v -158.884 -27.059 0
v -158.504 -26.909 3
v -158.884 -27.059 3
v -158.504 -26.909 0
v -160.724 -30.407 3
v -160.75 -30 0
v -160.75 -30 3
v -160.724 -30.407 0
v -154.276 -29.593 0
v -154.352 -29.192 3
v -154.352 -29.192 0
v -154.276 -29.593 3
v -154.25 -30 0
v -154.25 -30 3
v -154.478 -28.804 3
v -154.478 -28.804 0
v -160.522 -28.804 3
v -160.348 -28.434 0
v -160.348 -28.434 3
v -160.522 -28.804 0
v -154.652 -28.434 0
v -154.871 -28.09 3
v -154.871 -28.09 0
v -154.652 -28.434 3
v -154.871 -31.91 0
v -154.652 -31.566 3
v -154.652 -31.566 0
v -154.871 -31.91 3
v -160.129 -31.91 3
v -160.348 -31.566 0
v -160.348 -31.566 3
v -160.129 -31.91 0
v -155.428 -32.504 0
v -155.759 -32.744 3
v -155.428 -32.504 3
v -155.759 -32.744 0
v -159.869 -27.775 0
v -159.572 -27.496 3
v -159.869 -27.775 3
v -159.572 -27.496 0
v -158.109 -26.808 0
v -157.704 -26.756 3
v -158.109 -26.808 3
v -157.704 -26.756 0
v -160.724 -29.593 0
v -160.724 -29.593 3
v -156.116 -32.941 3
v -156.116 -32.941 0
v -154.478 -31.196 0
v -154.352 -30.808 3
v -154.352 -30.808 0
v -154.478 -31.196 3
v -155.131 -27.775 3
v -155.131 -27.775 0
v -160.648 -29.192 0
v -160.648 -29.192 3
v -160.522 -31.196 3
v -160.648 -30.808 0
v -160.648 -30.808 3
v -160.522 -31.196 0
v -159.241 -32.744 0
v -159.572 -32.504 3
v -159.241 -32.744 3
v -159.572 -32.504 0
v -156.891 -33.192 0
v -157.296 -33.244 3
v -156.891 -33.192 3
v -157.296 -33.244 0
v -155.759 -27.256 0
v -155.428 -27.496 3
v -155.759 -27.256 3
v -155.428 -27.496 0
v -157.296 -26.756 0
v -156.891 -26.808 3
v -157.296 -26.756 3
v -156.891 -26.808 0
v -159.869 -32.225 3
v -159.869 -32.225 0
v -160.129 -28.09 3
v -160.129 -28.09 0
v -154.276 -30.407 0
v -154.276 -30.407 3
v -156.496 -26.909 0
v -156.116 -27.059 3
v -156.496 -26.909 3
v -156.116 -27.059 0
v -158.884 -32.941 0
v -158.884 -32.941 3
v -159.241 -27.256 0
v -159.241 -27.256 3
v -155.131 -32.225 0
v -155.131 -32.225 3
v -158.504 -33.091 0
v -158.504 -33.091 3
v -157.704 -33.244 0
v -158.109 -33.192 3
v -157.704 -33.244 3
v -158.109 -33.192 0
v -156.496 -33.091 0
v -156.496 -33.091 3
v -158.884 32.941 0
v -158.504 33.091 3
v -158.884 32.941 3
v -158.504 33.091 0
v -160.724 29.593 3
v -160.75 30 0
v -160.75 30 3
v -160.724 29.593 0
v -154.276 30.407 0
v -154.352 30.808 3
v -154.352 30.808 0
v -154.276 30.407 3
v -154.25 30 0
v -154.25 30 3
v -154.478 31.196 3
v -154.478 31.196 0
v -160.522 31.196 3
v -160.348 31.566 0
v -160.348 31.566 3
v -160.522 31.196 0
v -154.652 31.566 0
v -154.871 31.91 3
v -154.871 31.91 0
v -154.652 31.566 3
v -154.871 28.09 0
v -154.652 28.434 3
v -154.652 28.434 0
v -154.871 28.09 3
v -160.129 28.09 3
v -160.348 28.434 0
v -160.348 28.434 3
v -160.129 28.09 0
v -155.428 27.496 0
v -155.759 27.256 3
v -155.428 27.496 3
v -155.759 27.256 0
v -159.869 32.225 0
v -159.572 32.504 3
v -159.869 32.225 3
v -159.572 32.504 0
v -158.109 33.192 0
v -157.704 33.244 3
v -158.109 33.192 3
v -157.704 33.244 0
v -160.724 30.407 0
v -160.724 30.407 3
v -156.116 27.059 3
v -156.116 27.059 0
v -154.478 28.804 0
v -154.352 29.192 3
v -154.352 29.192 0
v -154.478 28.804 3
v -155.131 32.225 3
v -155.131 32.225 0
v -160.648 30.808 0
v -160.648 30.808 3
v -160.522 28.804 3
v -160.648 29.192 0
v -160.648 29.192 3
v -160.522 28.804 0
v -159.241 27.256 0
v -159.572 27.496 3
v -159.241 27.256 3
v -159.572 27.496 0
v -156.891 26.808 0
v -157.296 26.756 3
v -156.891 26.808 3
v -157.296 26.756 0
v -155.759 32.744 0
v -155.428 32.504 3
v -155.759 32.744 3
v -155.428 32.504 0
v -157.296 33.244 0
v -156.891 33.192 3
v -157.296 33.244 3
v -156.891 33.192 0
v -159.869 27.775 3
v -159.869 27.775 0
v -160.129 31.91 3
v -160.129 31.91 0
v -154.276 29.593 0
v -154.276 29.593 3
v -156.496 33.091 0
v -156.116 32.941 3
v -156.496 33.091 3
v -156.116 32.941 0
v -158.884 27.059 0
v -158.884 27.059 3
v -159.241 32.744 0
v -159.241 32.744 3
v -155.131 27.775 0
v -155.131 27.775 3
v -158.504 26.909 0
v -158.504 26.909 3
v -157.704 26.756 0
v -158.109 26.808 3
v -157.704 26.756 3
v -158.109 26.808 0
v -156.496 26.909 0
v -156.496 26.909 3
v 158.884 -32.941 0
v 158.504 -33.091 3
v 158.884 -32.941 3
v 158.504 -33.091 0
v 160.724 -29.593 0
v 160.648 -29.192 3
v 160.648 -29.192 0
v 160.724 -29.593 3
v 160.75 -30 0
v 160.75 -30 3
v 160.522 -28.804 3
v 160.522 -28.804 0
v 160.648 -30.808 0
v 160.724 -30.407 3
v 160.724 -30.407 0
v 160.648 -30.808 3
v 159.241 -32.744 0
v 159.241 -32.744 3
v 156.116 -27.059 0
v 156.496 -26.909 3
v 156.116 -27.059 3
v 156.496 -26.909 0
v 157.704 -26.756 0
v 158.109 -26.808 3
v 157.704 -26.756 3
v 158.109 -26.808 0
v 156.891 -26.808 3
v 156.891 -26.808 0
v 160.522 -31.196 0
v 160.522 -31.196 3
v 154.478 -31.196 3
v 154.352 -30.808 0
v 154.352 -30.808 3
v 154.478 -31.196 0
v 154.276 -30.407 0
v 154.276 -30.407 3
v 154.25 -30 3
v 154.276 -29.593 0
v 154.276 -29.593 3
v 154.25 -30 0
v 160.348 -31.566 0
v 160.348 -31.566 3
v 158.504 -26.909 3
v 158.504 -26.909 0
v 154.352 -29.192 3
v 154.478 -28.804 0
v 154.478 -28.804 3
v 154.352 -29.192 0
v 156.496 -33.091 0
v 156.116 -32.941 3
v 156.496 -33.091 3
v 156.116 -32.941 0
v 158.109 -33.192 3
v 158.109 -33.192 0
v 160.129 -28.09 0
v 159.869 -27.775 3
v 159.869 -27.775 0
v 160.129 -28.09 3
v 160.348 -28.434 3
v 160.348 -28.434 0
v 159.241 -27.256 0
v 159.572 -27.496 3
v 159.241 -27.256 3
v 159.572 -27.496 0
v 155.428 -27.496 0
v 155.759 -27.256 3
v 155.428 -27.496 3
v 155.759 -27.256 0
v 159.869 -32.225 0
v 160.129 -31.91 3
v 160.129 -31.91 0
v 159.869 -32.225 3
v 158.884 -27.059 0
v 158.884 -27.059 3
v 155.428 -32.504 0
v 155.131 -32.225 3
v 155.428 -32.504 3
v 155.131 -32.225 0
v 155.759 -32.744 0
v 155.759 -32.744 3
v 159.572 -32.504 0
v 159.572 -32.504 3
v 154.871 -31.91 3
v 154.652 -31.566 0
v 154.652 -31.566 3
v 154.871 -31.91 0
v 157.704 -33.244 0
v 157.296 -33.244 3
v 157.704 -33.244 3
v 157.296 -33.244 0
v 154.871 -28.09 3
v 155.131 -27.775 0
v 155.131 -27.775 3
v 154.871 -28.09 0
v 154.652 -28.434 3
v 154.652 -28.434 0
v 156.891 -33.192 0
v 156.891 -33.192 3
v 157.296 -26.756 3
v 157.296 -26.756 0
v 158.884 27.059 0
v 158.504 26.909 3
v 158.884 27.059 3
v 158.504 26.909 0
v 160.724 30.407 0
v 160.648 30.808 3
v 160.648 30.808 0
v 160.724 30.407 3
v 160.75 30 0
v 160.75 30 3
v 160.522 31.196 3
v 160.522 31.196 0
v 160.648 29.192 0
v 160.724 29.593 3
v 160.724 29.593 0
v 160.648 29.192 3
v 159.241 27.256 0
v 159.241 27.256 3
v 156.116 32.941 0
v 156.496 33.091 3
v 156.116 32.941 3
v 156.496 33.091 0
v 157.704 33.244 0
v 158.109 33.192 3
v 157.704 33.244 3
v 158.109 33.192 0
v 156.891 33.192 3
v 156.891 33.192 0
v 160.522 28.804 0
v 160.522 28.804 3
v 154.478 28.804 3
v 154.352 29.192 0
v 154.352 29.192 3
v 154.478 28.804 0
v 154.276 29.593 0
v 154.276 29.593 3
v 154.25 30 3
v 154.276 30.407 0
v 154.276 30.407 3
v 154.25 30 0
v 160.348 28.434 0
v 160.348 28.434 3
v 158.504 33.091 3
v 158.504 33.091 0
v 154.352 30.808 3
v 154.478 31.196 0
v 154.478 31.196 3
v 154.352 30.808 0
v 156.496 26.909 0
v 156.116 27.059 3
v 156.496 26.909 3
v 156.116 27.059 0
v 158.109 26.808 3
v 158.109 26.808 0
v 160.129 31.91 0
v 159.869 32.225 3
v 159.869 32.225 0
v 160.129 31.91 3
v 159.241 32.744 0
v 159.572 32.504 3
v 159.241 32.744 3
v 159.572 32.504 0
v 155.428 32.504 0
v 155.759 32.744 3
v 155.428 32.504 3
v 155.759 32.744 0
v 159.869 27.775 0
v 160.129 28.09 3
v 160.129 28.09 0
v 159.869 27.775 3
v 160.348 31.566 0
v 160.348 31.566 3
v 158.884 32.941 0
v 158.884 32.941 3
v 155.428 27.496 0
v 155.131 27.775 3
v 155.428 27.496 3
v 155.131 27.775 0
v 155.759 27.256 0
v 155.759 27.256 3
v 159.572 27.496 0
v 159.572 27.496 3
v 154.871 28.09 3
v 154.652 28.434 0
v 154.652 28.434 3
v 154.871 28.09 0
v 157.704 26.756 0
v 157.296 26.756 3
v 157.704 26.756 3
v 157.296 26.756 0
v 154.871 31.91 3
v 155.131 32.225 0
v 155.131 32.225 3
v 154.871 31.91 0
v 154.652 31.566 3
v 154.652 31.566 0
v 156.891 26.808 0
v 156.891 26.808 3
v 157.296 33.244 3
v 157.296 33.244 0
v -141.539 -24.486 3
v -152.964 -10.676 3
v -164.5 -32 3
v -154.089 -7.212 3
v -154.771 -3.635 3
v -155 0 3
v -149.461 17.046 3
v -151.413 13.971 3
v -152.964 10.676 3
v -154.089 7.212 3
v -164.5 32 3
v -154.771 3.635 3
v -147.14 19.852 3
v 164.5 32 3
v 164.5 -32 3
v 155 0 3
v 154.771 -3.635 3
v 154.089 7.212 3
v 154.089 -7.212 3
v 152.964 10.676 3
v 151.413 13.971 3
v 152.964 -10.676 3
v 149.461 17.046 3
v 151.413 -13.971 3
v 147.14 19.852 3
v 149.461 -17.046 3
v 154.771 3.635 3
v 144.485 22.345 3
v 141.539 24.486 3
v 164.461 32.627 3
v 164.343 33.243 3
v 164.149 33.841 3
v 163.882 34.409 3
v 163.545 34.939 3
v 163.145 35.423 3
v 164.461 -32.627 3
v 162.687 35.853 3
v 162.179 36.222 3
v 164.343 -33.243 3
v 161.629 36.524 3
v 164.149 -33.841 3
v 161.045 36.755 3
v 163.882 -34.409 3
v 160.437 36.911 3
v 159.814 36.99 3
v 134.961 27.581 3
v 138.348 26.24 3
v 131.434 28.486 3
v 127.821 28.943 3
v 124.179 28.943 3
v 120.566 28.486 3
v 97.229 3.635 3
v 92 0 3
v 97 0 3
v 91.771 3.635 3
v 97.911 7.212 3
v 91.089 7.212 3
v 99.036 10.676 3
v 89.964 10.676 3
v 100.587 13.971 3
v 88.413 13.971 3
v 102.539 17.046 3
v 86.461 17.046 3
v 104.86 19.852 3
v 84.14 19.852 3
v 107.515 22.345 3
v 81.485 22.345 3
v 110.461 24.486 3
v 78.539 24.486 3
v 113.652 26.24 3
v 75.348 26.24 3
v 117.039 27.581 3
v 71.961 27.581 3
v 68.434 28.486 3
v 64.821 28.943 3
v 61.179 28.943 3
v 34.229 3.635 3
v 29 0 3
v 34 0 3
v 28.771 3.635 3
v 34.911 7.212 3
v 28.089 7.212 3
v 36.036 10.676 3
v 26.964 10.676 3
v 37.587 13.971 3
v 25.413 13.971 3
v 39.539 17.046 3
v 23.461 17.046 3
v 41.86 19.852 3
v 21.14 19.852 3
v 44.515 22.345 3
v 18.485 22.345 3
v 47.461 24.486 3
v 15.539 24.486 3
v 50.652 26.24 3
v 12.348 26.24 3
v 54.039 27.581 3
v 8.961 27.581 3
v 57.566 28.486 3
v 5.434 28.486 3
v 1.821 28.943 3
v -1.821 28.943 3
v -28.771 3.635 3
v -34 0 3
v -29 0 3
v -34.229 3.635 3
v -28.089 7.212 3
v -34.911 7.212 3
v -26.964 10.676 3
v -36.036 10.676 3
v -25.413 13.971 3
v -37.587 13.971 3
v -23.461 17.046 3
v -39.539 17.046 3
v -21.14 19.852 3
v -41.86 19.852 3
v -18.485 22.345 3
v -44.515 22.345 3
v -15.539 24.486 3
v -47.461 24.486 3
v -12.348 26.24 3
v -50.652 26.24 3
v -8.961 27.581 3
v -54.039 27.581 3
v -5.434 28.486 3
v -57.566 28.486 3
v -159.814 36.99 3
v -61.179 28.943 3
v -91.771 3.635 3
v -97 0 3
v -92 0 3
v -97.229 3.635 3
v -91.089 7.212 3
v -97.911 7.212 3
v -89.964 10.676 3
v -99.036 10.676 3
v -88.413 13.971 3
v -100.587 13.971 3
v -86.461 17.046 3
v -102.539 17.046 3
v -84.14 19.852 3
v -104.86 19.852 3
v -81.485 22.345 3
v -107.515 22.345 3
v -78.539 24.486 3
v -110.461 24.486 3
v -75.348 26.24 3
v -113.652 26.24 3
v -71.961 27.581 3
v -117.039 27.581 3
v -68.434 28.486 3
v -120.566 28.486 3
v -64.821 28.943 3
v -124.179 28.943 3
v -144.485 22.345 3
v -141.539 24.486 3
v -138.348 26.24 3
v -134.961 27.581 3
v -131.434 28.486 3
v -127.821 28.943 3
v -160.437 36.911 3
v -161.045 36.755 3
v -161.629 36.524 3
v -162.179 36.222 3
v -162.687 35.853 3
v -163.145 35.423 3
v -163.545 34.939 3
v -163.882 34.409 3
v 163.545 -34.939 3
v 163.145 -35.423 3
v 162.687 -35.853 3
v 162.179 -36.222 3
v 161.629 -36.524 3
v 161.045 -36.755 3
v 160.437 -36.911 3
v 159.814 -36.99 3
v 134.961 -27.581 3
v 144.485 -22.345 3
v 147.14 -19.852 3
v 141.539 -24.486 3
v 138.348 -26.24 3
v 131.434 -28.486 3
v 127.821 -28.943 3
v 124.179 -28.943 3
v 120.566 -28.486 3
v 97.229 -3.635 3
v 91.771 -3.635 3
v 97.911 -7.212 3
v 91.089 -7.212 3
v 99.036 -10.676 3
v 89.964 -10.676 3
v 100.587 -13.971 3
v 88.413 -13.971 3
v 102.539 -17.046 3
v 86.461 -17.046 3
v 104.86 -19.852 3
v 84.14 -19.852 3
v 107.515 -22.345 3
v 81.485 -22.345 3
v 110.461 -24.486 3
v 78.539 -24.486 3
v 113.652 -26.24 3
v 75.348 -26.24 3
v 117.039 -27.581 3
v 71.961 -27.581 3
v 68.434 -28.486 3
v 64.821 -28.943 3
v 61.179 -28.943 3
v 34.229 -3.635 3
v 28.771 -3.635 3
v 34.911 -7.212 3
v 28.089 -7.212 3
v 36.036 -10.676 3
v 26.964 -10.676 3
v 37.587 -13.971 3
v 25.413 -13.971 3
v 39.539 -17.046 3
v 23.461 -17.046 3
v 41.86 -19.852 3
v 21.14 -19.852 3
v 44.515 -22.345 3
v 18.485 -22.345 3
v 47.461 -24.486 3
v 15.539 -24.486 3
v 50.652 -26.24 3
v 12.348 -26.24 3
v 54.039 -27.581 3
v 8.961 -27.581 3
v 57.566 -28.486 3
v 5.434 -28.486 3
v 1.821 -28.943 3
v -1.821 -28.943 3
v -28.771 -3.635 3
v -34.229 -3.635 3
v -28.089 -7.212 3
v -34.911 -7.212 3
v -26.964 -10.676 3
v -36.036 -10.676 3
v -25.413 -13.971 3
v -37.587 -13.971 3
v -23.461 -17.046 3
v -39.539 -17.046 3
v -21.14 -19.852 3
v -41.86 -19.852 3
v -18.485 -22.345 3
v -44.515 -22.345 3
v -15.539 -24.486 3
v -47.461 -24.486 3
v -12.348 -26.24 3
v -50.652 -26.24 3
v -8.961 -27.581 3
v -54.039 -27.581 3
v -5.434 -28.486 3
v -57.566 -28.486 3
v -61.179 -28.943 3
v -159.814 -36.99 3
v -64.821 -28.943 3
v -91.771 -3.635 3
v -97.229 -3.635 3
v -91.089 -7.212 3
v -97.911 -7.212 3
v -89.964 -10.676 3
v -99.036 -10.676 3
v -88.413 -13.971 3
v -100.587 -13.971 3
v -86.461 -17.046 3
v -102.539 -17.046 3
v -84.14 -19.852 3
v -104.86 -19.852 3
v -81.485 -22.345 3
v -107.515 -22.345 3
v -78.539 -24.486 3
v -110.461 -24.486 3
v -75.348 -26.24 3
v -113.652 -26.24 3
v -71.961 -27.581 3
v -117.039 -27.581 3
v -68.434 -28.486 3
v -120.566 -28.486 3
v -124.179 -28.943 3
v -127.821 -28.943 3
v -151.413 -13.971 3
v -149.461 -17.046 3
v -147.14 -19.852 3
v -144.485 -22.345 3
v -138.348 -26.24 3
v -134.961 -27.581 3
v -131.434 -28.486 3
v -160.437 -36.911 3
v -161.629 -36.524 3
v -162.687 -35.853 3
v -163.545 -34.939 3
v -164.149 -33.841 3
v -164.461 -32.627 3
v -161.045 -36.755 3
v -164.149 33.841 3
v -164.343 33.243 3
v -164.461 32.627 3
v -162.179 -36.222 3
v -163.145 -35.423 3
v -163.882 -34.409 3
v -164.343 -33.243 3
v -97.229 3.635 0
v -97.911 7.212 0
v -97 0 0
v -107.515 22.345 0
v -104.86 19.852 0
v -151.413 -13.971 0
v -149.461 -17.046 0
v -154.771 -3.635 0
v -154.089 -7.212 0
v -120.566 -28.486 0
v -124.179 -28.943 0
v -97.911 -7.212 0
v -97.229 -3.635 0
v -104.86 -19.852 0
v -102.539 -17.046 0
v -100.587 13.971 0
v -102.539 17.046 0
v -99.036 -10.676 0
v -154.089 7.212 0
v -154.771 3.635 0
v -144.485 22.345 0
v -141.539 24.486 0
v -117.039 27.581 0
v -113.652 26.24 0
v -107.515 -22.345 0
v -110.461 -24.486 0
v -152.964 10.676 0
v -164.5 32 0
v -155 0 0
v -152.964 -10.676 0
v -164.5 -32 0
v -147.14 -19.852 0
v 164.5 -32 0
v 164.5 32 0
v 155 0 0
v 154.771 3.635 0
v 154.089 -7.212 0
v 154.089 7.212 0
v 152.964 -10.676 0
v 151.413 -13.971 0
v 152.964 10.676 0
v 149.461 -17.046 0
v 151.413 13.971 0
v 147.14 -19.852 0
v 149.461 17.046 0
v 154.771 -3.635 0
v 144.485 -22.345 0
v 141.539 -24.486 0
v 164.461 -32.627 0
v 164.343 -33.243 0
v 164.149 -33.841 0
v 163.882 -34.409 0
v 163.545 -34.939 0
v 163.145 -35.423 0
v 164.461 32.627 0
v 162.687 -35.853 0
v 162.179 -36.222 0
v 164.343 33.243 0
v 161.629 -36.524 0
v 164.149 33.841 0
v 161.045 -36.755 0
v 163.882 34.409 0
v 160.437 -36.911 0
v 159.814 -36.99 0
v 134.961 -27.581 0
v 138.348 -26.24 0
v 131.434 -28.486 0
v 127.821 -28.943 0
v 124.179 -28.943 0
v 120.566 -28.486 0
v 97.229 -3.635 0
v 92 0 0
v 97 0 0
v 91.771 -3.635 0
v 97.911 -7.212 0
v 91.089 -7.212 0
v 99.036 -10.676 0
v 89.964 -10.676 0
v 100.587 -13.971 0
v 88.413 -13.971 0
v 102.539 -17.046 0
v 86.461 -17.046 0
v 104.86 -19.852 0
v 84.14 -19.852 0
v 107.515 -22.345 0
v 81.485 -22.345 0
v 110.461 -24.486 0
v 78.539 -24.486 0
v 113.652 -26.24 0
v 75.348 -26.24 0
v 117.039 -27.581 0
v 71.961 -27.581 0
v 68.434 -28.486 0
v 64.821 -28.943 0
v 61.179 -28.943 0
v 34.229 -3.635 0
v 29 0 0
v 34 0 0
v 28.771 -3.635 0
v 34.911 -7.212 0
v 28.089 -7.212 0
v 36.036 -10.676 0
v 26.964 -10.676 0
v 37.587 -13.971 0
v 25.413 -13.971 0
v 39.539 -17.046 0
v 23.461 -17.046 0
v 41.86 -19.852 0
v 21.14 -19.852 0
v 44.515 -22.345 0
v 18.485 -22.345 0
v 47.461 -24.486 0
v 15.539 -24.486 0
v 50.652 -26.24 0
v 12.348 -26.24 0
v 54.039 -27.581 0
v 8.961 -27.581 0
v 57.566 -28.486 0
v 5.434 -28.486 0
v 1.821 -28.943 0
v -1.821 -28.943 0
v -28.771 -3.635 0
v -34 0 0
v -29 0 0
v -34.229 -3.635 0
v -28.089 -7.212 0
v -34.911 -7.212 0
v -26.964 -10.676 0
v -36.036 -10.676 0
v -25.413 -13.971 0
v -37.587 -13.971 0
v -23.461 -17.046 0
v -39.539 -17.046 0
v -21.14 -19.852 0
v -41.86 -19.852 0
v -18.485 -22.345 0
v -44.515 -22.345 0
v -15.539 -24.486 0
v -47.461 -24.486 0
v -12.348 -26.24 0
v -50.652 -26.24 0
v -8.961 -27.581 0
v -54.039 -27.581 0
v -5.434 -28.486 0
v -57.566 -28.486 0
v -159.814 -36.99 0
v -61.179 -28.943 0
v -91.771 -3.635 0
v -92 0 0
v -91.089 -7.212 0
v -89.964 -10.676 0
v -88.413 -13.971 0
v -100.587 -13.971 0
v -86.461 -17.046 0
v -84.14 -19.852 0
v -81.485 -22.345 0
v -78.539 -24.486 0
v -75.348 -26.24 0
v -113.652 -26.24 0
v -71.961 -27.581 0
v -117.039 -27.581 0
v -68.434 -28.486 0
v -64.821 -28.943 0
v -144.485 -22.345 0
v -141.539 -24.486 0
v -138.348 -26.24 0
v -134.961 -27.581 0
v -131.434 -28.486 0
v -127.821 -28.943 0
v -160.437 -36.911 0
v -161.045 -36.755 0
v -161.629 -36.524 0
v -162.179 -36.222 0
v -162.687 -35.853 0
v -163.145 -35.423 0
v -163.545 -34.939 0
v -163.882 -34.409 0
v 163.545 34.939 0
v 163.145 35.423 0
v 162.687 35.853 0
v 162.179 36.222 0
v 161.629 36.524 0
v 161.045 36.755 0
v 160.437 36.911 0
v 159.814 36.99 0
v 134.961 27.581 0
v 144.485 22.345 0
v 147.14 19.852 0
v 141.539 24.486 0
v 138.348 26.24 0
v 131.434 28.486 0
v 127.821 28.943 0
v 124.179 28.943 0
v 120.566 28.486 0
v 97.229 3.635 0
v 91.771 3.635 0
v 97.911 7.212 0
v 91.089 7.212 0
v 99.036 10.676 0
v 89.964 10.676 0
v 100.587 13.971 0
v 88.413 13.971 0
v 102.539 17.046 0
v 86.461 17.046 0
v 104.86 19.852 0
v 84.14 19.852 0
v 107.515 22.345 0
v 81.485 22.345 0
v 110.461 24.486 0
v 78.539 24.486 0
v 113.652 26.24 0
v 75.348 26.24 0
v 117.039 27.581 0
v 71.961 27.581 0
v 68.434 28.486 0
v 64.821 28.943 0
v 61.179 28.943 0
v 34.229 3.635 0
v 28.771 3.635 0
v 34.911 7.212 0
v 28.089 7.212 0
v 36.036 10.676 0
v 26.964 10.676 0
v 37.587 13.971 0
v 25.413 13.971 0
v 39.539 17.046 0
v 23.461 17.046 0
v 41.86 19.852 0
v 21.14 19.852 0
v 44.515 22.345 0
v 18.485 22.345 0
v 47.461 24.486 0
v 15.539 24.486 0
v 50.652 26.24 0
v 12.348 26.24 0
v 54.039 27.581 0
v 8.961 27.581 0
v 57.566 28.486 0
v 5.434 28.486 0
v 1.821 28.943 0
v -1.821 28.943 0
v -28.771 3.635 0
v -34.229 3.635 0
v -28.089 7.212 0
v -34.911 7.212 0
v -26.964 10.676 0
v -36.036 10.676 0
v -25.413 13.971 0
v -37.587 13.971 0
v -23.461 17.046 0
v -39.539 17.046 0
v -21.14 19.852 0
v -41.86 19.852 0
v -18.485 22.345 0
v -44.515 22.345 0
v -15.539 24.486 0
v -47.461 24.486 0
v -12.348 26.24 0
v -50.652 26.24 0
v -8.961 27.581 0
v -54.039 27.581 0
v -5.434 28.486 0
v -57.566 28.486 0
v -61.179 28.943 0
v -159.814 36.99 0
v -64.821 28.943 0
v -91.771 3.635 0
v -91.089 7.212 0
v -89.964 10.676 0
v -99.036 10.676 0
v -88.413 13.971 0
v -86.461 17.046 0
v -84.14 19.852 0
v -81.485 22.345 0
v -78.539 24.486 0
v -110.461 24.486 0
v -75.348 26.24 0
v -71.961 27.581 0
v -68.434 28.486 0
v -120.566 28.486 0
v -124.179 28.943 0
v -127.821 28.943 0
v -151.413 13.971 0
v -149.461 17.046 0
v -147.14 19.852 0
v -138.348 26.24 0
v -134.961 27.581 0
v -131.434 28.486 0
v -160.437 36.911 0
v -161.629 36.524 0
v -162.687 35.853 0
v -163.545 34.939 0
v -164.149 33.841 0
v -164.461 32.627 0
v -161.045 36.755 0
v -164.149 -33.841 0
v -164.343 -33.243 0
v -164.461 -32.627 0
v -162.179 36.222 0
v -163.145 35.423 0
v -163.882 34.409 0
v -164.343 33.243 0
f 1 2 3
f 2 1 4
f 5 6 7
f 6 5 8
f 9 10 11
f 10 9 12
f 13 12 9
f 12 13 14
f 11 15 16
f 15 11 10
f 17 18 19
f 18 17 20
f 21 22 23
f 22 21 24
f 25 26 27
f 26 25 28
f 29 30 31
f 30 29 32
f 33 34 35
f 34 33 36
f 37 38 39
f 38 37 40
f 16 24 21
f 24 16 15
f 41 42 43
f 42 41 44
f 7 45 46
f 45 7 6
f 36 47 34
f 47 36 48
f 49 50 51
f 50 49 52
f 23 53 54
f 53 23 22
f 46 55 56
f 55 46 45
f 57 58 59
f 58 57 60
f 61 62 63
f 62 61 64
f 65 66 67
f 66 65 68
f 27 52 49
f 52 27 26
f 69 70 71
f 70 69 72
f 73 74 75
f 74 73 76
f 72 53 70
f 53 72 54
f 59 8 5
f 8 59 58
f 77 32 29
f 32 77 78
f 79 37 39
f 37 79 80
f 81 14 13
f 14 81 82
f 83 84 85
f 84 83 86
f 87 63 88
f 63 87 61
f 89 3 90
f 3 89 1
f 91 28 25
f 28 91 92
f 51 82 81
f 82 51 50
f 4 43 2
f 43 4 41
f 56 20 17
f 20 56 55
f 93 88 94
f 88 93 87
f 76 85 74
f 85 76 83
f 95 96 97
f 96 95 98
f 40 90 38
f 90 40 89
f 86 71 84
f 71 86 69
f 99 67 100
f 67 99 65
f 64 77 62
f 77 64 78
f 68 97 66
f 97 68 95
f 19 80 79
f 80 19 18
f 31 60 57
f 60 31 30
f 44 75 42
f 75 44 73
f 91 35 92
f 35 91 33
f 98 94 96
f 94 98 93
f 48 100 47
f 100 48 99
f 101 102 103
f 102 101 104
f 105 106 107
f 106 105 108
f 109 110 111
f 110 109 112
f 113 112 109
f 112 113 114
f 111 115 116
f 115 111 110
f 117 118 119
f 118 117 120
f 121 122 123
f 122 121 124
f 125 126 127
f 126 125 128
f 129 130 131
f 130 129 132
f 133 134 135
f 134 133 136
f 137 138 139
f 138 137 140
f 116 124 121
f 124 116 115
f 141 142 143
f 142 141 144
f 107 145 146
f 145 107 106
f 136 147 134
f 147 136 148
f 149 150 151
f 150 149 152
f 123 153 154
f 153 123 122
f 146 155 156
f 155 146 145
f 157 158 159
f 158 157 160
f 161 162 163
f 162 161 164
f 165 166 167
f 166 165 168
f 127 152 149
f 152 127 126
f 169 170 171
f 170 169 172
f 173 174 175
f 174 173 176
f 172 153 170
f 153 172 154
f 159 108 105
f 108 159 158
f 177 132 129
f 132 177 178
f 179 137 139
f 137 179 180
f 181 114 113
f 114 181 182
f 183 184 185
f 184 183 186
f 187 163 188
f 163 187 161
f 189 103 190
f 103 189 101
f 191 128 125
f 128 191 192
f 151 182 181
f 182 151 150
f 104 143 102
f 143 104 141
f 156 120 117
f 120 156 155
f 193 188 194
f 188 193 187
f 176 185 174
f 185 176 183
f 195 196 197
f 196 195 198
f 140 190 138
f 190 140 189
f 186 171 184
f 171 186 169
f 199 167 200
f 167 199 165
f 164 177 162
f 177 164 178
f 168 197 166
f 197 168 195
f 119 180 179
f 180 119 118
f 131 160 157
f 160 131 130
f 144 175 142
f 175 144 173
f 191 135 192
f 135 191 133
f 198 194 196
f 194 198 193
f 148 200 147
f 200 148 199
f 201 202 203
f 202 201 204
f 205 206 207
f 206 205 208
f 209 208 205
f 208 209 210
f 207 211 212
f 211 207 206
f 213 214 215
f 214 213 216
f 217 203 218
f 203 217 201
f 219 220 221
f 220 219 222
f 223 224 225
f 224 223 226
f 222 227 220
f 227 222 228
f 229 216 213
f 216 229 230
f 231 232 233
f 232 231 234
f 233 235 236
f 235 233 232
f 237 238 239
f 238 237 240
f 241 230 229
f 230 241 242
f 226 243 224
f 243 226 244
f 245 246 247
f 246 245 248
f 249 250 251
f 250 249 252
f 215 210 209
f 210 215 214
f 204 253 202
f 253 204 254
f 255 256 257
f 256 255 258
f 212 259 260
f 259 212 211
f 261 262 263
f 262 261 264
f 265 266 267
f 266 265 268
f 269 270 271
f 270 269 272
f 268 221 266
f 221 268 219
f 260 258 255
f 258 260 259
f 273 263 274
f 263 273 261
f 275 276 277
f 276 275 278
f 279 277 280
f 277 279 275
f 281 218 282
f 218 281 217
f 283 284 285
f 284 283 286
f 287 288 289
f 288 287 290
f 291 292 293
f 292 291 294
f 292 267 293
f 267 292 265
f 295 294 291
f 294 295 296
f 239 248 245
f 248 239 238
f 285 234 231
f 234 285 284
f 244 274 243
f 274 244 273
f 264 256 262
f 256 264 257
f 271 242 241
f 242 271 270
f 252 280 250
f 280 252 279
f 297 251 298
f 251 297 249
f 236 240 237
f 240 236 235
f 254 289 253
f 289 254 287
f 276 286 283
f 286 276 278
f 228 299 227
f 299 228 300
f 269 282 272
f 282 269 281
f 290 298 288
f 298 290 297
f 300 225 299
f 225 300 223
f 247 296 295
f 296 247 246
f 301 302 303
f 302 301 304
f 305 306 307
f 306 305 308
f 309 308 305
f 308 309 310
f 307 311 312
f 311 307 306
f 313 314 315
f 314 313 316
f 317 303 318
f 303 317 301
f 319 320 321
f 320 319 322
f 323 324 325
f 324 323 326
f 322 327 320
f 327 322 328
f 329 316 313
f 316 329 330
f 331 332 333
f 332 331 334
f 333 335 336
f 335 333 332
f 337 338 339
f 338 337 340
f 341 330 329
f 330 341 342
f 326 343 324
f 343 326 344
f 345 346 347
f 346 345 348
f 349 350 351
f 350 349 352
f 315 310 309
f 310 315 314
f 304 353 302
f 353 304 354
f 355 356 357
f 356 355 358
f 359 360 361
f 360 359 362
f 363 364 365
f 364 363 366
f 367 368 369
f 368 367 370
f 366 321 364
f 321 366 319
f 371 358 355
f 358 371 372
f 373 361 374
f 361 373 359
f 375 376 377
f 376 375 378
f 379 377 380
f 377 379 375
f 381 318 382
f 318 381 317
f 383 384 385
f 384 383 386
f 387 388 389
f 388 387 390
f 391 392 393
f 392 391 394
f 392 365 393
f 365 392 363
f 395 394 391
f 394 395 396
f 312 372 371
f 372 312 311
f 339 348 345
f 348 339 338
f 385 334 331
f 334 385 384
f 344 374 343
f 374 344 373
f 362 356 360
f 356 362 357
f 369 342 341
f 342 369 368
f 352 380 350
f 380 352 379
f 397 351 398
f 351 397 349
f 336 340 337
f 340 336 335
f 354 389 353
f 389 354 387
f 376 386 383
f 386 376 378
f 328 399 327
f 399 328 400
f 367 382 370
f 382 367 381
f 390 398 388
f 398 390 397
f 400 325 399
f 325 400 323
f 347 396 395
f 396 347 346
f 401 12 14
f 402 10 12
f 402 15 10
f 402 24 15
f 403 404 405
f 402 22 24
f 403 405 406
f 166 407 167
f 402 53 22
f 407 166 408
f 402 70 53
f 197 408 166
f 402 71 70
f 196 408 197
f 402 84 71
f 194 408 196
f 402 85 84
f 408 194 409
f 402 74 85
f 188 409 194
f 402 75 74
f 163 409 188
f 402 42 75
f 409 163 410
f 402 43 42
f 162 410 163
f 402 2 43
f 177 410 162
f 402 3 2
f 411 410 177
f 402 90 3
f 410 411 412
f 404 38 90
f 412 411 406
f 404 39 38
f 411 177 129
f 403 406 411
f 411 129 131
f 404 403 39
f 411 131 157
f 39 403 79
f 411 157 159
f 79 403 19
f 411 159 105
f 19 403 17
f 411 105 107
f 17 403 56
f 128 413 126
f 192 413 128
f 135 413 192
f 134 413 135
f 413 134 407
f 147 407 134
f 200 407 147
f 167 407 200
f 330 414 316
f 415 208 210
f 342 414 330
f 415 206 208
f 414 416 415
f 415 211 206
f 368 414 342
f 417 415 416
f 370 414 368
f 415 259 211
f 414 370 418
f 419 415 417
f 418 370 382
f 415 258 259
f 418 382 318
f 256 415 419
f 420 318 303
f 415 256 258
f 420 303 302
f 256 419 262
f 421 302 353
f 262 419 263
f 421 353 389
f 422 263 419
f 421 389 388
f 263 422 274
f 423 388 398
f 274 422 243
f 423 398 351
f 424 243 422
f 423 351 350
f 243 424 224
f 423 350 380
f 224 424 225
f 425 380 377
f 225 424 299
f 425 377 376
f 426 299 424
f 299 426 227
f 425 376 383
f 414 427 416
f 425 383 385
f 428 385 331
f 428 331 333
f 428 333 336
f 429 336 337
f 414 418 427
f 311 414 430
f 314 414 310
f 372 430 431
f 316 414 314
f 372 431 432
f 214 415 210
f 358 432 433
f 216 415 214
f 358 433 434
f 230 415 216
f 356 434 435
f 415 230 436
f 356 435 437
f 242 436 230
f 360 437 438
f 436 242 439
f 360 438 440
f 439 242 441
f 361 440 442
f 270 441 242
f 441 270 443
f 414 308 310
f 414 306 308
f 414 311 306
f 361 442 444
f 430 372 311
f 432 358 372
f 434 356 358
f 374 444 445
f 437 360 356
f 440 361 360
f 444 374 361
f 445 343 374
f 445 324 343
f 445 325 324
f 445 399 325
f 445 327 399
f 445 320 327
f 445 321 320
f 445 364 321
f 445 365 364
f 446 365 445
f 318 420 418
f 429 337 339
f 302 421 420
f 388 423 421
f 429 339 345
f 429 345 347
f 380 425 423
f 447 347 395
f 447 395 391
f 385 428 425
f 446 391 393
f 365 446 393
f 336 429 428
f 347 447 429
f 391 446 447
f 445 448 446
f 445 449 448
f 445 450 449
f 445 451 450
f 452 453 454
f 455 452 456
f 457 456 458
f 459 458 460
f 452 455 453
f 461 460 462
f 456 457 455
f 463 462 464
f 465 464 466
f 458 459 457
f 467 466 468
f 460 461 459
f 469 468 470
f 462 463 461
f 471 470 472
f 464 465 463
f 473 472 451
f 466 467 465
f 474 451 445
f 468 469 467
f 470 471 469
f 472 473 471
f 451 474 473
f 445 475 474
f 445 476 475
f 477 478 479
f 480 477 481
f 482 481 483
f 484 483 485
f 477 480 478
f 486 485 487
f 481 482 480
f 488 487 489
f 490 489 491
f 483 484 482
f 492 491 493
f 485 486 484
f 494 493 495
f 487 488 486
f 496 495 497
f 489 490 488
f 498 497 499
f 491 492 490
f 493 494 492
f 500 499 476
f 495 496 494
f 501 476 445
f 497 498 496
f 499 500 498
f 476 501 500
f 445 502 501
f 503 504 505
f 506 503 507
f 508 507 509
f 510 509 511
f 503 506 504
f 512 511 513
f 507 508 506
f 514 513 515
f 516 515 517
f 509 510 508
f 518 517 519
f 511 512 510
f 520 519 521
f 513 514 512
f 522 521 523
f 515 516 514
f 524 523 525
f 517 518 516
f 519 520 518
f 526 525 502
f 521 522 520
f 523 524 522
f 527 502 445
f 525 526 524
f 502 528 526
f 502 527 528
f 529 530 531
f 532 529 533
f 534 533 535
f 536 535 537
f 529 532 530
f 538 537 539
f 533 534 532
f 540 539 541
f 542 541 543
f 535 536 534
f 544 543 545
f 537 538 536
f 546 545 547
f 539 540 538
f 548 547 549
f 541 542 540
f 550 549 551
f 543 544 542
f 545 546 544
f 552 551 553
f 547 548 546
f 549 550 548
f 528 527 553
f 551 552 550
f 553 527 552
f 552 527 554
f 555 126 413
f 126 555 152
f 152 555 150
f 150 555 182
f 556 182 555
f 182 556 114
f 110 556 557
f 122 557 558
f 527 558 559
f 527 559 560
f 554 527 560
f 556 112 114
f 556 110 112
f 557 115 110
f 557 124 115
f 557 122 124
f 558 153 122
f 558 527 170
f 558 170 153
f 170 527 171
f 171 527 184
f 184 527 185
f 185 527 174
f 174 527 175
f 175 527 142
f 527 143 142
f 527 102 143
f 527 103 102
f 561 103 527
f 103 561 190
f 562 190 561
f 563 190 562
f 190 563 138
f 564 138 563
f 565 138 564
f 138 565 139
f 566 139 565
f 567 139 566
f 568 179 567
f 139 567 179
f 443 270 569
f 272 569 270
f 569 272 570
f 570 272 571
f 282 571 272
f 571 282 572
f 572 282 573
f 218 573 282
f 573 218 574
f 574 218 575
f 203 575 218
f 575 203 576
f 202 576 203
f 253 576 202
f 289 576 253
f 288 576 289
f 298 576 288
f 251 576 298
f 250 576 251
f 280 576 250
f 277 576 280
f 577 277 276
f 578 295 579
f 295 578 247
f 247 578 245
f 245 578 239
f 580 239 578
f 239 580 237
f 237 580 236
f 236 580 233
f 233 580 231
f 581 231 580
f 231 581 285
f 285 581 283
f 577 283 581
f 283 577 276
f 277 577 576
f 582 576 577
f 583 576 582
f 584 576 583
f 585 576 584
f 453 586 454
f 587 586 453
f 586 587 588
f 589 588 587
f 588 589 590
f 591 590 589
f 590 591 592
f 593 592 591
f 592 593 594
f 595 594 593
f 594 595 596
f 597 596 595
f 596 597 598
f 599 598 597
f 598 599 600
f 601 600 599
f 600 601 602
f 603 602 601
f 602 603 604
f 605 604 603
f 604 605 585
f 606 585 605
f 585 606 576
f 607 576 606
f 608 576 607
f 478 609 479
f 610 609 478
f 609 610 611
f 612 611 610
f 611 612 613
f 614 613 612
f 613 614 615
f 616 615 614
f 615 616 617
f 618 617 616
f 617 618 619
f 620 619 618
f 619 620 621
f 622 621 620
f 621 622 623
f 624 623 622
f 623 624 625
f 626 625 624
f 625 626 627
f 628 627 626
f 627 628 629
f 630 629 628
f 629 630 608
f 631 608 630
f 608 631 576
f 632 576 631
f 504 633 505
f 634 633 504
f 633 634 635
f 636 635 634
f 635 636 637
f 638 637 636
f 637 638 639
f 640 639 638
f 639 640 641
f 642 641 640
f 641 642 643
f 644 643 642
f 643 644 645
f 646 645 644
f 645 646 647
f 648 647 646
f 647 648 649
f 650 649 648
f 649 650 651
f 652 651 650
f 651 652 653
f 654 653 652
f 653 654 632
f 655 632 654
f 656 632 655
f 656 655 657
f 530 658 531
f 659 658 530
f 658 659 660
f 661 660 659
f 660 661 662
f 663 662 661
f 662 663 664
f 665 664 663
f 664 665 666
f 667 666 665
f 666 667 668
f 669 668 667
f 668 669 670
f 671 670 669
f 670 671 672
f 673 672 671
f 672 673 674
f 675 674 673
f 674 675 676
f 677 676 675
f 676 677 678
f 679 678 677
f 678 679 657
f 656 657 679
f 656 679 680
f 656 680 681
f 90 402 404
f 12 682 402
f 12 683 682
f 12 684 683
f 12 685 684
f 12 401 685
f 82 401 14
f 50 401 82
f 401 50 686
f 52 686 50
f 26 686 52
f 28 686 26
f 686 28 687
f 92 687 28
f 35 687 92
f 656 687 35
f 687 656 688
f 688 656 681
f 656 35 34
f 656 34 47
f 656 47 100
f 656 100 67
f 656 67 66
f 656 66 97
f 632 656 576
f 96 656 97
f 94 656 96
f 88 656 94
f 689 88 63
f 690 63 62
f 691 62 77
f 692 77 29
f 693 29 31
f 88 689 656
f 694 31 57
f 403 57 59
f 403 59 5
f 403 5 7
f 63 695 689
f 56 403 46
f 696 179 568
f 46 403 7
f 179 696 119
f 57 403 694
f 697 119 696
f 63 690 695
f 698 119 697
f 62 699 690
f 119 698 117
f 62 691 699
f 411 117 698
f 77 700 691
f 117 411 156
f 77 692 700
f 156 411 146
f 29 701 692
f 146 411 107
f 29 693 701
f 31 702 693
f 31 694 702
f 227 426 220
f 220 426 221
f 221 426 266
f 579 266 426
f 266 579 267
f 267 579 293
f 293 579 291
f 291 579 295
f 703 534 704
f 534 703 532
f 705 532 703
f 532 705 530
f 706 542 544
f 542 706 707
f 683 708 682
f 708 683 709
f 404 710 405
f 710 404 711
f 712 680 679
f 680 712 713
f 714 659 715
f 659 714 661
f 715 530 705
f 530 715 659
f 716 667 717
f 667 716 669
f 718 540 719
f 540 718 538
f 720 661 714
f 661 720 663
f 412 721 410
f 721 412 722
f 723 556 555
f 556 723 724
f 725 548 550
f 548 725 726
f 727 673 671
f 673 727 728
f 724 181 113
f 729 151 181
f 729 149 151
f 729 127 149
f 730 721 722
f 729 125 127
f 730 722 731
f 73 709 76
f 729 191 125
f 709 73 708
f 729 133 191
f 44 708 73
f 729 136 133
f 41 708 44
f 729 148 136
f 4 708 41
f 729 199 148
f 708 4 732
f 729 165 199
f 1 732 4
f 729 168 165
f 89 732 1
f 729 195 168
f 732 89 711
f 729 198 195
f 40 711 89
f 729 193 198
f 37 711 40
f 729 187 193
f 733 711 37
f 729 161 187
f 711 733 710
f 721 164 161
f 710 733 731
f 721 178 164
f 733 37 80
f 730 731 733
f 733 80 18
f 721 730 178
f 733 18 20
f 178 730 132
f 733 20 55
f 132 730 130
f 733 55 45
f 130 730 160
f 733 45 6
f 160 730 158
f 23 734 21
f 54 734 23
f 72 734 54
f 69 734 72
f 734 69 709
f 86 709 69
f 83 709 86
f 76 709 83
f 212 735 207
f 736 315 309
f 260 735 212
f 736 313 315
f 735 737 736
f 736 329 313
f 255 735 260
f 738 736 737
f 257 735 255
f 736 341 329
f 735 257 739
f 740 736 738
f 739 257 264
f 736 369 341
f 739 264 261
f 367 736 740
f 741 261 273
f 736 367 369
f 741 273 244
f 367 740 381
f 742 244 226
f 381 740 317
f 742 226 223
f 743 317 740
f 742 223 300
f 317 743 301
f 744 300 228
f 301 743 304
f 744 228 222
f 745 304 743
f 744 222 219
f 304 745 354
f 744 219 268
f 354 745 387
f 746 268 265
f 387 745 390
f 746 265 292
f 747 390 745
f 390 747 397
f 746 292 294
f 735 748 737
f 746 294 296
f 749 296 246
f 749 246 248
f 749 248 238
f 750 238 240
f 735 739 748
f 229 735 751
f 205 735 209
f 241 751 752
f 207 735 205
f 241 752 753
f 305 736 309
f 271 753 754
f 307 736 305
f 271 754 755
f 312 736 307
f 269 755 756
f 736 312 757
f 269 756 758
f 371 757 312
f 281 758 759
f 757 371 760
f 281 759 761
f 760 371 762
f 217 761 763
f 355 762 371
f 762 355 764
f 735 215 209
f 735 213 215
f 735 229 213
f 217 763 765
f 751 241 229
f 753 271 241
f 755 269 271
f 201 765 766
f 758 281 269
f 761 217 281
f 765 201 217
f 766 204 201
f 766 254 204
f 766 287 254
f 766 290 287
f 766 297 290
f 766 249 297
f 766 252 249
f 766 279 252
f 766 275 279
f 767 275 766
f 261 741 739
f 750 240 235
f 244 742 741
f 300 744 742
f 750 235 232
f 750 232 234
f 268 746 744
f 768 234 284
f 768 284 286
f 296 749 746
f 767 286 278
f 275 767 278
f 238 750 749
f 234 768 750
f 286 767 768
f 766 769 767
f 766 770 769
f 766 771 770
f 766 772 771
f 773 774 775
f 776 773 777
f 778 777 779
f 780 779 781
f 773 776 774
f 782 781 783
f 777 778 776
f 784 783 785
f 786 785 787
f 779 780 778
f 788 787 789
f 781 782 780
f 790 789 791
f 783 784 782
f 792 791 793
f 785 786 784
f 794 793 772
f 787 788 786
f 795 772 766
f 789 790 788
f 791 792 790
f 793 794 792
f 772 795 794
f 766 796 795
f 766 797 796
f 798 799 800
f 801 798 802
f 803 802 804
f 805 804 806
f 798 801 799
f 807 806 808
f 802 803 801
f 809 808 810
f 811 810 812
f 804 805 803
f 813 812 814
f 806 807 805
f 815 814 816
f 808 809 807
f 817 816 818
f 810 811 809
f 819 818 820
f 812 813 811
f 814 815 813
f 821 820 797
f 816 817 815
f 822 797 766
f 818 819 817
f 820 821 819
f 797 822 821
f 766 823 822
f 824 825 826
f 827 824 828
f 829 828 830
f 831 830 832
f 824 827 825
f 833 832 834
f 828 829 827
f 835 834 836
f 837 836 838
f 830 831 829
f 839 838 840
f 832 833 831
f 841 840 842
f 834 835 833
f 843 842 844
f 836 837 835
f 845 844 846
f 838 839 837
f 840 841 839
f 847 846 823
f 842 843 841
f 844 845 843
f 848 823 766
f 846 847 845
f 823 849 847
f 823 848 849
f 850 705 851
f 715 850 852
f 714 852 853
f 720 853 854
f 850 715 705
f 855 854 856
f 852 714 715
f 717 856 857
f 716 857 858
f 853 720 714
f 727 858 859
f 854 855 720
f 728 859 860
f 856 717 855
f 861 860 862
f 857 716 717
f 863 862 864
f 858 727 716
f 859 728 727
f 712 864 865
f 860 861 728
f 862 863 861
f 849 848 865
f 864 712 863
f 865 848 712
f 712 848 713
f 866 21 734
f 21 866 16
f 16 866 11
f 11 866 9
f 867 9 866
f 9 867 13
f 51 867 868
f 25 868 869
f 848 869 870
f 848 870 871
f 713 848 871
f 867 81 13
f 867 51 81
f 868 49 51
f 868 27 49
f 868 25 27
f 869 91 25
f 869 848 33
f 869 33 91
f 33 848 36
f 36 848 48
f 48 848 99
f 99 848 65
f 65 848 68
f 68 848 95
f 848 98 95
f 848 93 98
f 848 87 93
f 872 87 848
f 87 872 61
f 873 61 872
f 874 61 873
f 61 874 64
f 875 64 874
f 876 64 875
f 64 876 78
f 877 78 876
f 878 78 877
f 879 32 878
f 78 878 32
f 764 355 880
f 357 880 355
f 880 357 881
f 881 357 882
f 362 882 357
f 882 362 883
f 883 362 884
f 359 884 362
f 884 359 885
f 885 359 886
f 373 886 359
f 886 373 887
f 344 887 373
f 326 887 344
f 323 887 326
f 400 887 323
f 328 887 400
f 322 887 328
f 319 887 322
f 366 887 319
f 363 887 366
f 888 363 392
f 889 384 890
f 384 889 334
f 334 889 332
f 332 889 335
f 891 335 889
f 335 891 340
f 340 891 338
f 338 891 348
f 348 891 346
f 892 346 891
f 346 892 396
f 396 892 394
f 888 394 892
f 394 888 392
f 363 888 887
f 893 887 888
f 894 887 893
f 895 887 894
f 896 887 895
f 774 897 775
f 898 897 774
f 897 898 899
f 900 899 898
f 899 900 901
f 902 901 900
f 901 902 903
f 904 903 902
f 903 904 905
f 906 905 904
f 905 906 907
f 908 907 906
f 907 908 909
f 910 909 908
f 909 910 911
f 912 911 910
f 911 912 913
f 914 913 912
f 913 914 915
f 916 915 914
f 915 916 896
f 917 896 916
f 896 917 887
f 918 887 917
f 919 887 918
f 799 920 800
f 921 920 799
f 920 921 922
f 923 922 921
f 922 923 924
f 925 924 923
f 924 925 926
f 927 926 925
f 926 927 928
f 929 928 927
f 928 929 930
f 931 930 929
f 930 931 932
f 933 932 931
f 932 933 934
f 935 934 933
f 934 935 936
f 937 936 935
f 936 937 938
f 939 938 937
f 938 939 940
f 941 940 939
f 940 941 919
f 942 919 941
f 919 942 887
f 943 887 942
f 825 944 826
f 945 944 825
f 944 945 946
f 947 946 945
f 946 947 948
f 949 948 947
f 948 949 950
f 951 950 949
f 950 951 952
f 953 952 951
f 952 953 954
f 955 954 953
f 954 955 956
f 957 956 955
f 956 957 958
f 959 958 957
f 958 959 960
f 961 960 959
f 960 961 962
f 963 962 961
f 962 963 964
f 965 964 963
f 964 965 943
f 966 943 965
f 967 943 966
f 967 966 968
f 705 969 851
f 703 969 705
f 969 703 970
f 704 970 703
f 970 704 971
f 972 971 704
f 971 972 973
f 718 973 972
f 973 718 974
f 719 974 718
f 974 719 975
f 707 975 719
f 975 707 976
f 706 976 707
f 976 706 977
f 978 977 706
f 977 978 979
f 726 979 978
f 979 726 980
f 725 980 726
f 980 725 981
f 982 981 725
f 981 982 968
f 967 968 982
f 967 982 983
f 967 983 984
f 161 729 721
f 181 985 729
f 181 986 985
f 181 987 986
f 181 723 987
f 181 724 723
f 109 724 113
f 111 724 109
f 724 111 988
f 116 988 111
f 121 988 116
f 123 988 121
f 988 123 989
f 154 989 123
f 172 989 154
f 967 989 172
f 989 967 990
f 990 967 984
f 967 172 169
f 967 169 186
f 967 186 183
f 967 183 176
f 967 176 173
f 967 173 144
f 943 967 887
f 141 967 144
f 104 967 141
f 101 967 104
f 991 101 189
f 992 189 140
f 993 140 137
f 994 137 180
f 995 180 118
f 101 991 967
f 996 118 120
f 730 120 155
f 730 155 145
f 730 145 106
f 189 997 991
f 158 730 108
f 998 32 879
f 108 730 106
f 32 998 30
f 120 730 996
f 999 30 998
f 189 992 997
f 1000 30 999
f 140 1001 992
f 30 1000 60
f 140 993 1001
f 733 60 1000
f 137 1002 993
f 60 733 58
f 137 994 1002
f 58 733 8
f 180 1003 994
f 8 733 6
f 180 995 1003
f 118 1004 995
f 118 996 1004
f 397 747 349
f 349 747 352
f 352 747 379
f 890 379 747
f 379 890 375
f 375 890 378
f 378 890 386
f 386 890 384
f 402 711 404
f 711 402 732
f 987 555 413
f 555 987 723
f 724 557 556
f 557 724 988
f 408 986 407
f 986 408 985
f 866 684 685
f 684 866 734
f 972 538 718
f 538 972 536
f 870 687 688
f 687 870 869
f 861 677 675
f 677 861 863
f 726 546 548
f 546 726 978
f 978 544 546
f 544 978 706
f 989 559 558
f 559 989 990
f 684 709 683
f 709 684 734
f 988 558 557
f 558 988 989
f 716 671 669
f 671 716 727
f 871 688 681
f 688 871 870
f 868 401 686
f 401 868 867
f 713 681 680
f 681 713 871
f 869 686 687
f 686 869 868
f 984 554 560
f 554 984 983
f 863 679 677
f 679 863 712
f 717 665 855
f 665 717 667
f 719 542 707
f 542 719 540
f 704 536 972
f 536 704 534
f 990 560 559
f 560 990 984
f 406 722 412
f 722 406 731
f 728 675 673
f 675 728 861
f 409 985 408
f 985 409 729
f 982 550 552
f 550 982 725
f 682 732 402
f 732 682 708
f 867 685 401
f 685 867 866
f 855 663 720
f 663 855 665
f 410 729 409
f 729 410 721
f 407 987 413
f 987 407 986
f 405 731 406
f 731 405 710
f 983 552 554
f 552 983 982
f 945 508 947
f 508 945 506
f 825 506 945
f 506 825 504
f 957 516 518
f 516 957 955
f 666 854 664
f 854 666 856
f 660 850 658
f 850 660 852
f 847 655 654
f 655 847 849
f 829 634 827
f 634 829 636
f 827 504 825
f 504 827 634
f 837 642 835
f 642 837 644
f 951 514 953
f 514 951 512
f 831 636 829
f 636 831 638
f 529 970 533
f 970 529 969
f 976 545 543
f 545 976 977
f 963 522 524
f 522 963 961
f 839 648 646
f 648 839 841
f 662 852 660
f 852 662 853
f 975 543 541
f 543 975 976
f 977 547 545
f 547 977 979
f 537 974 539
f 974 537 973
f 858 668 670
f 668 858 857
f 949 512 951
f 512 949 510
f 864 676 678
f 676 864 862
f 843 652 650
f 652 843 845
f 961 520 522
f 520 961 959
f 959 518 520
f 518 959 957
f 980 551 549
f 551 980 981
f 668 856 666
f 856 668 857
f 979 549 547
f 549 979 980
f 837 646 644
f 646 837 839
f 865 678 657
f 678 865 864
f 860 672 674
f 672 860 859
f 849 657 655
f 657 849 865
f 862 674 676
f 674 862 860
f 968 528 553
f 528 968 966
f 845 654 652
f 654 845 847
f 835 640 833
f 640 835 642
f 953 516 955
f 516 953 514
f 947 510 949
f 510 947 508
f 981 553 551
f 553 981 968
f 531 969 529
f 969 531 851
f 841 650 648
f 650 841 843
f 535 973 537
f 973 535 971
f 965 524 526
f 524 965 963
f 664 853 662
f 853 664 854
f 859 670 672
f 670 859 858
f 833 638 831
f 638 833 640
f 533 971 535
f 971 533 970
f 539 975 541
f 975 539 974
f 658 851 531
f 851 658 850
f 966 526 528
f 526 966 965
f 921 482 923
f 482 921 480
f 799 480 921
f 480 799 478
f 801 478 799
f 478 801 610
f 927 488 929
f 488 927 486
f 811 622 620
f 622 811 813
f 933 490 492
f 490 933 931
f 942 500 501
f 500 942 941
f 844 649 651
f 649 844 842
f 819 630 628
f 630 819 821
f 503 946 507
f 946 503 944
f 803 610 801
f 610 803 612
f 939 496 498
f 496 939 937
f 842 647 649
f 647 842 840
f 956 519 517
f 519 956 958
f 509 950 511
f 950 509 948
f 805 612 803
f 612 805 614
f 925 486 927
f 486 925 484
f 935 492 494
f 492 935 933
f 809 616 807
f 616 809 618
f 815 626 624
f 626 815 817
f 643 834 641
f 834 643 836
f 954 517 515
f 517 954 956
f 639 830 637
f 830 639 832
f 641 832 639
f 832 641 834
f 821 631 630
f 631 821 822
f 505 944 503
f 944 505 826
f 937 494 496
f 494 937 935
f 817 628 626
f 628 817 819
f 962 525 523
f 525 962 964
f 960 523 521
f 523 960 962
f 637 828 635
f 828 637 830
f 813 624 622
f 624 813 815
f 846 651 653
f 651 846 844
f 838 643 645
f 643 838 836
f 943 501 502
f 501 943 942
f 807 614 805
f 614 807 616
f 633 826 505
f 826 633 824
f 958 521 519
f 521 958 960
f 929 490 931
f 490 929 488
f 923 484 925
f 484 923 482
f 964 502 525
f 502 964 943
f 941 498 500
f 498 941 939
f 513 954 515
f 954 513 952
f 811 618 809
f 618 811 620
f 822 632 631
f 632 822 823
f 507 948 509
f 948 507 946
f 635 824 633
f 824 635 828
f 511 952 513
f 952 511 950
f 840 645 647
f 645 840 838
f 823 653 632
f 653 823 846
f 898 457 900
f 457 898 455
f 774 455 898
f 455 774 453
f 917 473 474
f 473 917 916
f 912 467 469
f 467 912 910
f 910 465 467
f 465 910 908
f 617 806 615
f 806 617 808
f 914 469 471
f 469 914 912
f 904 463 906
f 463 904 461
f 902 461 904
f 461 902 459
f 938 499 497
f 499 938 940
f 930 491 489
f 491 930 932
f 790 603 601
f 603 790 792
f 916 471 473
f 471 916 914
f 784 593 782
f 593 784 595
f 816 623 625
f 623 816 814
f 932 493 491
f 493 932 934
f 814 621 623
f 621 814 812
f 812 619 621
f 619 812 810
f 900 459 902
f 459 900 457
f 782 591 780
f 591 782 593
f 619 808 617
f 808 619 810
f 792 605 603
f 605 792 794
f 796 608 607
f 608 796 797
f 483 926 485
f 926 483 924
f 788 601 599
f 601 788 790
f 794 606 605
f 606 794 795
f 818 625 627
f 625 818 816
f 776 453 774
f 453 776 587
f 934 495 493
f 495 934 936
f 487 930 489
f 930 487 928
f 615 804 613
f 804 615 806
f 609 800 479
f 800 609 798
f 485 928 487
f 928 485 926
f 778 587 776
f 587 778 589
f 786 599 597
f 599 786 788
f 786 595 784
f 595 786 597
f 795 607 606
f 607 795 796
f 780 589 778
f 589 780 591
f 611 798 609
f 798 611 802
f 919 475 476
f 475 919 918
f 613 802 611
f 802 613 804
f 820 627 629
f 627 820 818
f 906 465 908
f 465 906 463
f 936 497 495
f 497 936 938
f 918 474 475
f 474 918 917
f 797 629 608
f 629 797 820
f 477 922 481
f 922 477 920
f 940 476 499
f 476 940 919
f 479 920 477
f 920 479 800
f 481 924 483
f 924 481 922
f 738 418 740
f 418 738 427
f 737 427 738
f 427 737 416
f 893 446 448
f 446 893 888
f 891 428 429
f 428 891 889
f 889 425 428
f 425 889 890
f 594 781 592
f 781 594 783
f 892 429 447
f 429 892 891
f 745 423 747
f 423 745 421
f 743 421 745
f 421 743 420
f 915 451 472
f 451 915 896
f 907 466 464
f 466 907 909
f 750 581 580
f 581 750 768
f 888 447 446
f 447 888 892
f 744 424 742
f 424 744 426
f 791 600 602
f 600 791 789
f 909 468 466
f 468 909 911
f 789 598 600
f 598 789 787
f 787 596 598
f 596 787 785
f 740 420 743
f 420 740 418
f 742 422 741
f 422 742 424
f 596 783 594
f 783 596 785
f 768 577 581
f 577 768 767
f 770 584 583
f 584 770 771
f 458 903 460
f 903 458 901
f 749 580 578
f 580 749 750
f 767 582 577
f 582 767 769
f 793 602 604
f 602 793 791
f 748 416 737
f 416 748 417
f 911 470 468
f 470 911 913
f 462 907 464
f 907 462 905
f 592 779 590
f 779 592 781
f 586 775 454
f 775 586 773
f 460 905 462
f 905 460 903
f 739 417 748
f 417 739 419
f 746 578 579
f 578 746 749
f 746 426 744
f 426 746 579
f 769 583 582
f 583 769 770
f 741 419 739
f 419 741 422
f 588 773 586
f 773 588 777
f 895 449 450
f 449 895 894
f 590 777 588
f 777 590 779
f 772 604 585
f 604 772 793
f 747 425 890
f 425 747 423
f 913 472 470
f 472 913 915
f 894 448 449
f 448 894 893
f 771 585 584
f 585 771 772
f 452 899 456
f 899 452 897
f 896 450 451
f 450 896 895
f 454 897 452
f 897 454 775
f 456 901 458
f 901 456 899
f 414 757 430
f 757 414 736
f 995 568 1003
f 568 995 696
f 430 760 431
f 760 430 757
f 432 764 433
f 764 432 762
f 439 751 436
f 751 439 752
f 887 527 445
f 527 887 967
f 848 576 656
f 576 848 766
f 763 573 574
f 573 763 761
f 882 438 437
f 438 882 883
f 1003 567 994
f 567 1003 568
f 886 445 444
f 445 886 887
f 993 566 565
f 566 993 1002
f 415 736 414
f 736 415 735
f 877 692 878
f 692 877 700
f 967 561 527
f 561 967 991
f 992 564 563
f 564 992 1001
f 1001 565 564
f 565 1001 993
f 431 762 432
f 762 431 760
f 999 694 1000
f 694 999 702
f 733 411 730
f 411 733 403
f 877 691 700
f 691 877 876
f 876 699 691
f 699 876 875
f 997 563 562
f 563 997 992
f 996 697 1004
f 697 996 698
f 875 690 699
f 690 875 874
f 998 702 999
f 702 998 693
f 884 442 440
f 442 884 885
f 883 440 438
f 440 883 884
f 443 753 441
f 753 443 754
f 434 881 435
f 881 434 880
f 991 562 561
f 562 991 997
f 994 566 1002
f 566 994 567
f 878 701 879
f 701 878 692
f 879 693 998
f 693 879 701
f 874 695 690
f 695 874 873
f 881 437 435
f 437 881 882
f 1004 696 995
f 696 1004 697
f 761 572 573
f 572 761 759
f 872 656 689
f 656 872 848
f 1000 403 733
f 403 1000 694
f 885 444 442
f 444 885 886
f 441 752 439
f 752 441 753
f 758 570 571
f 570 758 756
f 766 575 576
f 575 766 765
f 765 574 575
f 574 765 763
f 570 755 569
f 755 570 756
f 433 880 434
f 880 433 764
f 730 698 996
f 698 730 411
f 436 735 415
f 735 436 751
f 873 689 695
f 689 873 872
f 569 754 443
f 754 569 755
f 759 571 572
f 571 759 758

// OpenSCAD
$fn = 50;


difference() {
	union() {
		hull() {
			translate(v = [-159.5000000000, 32.0000000000, 0]) {
				cylinder(h = 3, r = 5);
			}
			translate(v = [159.5000000000, 32.0000000000, 0]) {
				cylinder(h = 3, r = 5);
			}
			translate(v = [-159.5000000000, -32.0000000000, 0]) {
				cylinder(h = 3, r = 5);
			}
			translate(v = [159.5000000000, -32.0000000000, 0]) {
				cylinder(h = 3, r = 5);
			}
		}
	}
	union() {
		#translate(v = [-157.5000000000, -30.0000000000, -100.0000000000]) {
			cylinder(h = 200, r = 3.2500000000);
		}
		#translate(v = [-157.5000000000, 30.0000000000, -100.0000000000]) {
			cylinder(h = 200, r = 3.2500000000);
		}
		#translate(v = [157.5000000000, -30.0000000000, -100.0000000000]) {
			cylinder(h = 200, r = 3.2500000000);
		}
		#translate(v = [157.5000000000, 30.0000000000, -100.0000000000]) {
			cylinder(h = 200, r = 3.2500000000);
		}
		#translate(v = [-126.0000000000, 0, 0]) {
			cylinder(h = 3, r = 29.0000000000);
		}
		#translate(v = [-63.0000000000, 0, 0]) {
			cylinder(h = 3, r = 29.0000000000);
		}
		#cylinder(h = 3, r = 29.0000000000);
		#translate(v = [63.0000000000, 0, 0]) {
			cylinder(h = 3, r = 29.0000000000);
		}
		#translate(v = [126.0000000000, 0, 0]) {
			cylinder(h = 3, r = 29.0000000000);
		}
	}
}
